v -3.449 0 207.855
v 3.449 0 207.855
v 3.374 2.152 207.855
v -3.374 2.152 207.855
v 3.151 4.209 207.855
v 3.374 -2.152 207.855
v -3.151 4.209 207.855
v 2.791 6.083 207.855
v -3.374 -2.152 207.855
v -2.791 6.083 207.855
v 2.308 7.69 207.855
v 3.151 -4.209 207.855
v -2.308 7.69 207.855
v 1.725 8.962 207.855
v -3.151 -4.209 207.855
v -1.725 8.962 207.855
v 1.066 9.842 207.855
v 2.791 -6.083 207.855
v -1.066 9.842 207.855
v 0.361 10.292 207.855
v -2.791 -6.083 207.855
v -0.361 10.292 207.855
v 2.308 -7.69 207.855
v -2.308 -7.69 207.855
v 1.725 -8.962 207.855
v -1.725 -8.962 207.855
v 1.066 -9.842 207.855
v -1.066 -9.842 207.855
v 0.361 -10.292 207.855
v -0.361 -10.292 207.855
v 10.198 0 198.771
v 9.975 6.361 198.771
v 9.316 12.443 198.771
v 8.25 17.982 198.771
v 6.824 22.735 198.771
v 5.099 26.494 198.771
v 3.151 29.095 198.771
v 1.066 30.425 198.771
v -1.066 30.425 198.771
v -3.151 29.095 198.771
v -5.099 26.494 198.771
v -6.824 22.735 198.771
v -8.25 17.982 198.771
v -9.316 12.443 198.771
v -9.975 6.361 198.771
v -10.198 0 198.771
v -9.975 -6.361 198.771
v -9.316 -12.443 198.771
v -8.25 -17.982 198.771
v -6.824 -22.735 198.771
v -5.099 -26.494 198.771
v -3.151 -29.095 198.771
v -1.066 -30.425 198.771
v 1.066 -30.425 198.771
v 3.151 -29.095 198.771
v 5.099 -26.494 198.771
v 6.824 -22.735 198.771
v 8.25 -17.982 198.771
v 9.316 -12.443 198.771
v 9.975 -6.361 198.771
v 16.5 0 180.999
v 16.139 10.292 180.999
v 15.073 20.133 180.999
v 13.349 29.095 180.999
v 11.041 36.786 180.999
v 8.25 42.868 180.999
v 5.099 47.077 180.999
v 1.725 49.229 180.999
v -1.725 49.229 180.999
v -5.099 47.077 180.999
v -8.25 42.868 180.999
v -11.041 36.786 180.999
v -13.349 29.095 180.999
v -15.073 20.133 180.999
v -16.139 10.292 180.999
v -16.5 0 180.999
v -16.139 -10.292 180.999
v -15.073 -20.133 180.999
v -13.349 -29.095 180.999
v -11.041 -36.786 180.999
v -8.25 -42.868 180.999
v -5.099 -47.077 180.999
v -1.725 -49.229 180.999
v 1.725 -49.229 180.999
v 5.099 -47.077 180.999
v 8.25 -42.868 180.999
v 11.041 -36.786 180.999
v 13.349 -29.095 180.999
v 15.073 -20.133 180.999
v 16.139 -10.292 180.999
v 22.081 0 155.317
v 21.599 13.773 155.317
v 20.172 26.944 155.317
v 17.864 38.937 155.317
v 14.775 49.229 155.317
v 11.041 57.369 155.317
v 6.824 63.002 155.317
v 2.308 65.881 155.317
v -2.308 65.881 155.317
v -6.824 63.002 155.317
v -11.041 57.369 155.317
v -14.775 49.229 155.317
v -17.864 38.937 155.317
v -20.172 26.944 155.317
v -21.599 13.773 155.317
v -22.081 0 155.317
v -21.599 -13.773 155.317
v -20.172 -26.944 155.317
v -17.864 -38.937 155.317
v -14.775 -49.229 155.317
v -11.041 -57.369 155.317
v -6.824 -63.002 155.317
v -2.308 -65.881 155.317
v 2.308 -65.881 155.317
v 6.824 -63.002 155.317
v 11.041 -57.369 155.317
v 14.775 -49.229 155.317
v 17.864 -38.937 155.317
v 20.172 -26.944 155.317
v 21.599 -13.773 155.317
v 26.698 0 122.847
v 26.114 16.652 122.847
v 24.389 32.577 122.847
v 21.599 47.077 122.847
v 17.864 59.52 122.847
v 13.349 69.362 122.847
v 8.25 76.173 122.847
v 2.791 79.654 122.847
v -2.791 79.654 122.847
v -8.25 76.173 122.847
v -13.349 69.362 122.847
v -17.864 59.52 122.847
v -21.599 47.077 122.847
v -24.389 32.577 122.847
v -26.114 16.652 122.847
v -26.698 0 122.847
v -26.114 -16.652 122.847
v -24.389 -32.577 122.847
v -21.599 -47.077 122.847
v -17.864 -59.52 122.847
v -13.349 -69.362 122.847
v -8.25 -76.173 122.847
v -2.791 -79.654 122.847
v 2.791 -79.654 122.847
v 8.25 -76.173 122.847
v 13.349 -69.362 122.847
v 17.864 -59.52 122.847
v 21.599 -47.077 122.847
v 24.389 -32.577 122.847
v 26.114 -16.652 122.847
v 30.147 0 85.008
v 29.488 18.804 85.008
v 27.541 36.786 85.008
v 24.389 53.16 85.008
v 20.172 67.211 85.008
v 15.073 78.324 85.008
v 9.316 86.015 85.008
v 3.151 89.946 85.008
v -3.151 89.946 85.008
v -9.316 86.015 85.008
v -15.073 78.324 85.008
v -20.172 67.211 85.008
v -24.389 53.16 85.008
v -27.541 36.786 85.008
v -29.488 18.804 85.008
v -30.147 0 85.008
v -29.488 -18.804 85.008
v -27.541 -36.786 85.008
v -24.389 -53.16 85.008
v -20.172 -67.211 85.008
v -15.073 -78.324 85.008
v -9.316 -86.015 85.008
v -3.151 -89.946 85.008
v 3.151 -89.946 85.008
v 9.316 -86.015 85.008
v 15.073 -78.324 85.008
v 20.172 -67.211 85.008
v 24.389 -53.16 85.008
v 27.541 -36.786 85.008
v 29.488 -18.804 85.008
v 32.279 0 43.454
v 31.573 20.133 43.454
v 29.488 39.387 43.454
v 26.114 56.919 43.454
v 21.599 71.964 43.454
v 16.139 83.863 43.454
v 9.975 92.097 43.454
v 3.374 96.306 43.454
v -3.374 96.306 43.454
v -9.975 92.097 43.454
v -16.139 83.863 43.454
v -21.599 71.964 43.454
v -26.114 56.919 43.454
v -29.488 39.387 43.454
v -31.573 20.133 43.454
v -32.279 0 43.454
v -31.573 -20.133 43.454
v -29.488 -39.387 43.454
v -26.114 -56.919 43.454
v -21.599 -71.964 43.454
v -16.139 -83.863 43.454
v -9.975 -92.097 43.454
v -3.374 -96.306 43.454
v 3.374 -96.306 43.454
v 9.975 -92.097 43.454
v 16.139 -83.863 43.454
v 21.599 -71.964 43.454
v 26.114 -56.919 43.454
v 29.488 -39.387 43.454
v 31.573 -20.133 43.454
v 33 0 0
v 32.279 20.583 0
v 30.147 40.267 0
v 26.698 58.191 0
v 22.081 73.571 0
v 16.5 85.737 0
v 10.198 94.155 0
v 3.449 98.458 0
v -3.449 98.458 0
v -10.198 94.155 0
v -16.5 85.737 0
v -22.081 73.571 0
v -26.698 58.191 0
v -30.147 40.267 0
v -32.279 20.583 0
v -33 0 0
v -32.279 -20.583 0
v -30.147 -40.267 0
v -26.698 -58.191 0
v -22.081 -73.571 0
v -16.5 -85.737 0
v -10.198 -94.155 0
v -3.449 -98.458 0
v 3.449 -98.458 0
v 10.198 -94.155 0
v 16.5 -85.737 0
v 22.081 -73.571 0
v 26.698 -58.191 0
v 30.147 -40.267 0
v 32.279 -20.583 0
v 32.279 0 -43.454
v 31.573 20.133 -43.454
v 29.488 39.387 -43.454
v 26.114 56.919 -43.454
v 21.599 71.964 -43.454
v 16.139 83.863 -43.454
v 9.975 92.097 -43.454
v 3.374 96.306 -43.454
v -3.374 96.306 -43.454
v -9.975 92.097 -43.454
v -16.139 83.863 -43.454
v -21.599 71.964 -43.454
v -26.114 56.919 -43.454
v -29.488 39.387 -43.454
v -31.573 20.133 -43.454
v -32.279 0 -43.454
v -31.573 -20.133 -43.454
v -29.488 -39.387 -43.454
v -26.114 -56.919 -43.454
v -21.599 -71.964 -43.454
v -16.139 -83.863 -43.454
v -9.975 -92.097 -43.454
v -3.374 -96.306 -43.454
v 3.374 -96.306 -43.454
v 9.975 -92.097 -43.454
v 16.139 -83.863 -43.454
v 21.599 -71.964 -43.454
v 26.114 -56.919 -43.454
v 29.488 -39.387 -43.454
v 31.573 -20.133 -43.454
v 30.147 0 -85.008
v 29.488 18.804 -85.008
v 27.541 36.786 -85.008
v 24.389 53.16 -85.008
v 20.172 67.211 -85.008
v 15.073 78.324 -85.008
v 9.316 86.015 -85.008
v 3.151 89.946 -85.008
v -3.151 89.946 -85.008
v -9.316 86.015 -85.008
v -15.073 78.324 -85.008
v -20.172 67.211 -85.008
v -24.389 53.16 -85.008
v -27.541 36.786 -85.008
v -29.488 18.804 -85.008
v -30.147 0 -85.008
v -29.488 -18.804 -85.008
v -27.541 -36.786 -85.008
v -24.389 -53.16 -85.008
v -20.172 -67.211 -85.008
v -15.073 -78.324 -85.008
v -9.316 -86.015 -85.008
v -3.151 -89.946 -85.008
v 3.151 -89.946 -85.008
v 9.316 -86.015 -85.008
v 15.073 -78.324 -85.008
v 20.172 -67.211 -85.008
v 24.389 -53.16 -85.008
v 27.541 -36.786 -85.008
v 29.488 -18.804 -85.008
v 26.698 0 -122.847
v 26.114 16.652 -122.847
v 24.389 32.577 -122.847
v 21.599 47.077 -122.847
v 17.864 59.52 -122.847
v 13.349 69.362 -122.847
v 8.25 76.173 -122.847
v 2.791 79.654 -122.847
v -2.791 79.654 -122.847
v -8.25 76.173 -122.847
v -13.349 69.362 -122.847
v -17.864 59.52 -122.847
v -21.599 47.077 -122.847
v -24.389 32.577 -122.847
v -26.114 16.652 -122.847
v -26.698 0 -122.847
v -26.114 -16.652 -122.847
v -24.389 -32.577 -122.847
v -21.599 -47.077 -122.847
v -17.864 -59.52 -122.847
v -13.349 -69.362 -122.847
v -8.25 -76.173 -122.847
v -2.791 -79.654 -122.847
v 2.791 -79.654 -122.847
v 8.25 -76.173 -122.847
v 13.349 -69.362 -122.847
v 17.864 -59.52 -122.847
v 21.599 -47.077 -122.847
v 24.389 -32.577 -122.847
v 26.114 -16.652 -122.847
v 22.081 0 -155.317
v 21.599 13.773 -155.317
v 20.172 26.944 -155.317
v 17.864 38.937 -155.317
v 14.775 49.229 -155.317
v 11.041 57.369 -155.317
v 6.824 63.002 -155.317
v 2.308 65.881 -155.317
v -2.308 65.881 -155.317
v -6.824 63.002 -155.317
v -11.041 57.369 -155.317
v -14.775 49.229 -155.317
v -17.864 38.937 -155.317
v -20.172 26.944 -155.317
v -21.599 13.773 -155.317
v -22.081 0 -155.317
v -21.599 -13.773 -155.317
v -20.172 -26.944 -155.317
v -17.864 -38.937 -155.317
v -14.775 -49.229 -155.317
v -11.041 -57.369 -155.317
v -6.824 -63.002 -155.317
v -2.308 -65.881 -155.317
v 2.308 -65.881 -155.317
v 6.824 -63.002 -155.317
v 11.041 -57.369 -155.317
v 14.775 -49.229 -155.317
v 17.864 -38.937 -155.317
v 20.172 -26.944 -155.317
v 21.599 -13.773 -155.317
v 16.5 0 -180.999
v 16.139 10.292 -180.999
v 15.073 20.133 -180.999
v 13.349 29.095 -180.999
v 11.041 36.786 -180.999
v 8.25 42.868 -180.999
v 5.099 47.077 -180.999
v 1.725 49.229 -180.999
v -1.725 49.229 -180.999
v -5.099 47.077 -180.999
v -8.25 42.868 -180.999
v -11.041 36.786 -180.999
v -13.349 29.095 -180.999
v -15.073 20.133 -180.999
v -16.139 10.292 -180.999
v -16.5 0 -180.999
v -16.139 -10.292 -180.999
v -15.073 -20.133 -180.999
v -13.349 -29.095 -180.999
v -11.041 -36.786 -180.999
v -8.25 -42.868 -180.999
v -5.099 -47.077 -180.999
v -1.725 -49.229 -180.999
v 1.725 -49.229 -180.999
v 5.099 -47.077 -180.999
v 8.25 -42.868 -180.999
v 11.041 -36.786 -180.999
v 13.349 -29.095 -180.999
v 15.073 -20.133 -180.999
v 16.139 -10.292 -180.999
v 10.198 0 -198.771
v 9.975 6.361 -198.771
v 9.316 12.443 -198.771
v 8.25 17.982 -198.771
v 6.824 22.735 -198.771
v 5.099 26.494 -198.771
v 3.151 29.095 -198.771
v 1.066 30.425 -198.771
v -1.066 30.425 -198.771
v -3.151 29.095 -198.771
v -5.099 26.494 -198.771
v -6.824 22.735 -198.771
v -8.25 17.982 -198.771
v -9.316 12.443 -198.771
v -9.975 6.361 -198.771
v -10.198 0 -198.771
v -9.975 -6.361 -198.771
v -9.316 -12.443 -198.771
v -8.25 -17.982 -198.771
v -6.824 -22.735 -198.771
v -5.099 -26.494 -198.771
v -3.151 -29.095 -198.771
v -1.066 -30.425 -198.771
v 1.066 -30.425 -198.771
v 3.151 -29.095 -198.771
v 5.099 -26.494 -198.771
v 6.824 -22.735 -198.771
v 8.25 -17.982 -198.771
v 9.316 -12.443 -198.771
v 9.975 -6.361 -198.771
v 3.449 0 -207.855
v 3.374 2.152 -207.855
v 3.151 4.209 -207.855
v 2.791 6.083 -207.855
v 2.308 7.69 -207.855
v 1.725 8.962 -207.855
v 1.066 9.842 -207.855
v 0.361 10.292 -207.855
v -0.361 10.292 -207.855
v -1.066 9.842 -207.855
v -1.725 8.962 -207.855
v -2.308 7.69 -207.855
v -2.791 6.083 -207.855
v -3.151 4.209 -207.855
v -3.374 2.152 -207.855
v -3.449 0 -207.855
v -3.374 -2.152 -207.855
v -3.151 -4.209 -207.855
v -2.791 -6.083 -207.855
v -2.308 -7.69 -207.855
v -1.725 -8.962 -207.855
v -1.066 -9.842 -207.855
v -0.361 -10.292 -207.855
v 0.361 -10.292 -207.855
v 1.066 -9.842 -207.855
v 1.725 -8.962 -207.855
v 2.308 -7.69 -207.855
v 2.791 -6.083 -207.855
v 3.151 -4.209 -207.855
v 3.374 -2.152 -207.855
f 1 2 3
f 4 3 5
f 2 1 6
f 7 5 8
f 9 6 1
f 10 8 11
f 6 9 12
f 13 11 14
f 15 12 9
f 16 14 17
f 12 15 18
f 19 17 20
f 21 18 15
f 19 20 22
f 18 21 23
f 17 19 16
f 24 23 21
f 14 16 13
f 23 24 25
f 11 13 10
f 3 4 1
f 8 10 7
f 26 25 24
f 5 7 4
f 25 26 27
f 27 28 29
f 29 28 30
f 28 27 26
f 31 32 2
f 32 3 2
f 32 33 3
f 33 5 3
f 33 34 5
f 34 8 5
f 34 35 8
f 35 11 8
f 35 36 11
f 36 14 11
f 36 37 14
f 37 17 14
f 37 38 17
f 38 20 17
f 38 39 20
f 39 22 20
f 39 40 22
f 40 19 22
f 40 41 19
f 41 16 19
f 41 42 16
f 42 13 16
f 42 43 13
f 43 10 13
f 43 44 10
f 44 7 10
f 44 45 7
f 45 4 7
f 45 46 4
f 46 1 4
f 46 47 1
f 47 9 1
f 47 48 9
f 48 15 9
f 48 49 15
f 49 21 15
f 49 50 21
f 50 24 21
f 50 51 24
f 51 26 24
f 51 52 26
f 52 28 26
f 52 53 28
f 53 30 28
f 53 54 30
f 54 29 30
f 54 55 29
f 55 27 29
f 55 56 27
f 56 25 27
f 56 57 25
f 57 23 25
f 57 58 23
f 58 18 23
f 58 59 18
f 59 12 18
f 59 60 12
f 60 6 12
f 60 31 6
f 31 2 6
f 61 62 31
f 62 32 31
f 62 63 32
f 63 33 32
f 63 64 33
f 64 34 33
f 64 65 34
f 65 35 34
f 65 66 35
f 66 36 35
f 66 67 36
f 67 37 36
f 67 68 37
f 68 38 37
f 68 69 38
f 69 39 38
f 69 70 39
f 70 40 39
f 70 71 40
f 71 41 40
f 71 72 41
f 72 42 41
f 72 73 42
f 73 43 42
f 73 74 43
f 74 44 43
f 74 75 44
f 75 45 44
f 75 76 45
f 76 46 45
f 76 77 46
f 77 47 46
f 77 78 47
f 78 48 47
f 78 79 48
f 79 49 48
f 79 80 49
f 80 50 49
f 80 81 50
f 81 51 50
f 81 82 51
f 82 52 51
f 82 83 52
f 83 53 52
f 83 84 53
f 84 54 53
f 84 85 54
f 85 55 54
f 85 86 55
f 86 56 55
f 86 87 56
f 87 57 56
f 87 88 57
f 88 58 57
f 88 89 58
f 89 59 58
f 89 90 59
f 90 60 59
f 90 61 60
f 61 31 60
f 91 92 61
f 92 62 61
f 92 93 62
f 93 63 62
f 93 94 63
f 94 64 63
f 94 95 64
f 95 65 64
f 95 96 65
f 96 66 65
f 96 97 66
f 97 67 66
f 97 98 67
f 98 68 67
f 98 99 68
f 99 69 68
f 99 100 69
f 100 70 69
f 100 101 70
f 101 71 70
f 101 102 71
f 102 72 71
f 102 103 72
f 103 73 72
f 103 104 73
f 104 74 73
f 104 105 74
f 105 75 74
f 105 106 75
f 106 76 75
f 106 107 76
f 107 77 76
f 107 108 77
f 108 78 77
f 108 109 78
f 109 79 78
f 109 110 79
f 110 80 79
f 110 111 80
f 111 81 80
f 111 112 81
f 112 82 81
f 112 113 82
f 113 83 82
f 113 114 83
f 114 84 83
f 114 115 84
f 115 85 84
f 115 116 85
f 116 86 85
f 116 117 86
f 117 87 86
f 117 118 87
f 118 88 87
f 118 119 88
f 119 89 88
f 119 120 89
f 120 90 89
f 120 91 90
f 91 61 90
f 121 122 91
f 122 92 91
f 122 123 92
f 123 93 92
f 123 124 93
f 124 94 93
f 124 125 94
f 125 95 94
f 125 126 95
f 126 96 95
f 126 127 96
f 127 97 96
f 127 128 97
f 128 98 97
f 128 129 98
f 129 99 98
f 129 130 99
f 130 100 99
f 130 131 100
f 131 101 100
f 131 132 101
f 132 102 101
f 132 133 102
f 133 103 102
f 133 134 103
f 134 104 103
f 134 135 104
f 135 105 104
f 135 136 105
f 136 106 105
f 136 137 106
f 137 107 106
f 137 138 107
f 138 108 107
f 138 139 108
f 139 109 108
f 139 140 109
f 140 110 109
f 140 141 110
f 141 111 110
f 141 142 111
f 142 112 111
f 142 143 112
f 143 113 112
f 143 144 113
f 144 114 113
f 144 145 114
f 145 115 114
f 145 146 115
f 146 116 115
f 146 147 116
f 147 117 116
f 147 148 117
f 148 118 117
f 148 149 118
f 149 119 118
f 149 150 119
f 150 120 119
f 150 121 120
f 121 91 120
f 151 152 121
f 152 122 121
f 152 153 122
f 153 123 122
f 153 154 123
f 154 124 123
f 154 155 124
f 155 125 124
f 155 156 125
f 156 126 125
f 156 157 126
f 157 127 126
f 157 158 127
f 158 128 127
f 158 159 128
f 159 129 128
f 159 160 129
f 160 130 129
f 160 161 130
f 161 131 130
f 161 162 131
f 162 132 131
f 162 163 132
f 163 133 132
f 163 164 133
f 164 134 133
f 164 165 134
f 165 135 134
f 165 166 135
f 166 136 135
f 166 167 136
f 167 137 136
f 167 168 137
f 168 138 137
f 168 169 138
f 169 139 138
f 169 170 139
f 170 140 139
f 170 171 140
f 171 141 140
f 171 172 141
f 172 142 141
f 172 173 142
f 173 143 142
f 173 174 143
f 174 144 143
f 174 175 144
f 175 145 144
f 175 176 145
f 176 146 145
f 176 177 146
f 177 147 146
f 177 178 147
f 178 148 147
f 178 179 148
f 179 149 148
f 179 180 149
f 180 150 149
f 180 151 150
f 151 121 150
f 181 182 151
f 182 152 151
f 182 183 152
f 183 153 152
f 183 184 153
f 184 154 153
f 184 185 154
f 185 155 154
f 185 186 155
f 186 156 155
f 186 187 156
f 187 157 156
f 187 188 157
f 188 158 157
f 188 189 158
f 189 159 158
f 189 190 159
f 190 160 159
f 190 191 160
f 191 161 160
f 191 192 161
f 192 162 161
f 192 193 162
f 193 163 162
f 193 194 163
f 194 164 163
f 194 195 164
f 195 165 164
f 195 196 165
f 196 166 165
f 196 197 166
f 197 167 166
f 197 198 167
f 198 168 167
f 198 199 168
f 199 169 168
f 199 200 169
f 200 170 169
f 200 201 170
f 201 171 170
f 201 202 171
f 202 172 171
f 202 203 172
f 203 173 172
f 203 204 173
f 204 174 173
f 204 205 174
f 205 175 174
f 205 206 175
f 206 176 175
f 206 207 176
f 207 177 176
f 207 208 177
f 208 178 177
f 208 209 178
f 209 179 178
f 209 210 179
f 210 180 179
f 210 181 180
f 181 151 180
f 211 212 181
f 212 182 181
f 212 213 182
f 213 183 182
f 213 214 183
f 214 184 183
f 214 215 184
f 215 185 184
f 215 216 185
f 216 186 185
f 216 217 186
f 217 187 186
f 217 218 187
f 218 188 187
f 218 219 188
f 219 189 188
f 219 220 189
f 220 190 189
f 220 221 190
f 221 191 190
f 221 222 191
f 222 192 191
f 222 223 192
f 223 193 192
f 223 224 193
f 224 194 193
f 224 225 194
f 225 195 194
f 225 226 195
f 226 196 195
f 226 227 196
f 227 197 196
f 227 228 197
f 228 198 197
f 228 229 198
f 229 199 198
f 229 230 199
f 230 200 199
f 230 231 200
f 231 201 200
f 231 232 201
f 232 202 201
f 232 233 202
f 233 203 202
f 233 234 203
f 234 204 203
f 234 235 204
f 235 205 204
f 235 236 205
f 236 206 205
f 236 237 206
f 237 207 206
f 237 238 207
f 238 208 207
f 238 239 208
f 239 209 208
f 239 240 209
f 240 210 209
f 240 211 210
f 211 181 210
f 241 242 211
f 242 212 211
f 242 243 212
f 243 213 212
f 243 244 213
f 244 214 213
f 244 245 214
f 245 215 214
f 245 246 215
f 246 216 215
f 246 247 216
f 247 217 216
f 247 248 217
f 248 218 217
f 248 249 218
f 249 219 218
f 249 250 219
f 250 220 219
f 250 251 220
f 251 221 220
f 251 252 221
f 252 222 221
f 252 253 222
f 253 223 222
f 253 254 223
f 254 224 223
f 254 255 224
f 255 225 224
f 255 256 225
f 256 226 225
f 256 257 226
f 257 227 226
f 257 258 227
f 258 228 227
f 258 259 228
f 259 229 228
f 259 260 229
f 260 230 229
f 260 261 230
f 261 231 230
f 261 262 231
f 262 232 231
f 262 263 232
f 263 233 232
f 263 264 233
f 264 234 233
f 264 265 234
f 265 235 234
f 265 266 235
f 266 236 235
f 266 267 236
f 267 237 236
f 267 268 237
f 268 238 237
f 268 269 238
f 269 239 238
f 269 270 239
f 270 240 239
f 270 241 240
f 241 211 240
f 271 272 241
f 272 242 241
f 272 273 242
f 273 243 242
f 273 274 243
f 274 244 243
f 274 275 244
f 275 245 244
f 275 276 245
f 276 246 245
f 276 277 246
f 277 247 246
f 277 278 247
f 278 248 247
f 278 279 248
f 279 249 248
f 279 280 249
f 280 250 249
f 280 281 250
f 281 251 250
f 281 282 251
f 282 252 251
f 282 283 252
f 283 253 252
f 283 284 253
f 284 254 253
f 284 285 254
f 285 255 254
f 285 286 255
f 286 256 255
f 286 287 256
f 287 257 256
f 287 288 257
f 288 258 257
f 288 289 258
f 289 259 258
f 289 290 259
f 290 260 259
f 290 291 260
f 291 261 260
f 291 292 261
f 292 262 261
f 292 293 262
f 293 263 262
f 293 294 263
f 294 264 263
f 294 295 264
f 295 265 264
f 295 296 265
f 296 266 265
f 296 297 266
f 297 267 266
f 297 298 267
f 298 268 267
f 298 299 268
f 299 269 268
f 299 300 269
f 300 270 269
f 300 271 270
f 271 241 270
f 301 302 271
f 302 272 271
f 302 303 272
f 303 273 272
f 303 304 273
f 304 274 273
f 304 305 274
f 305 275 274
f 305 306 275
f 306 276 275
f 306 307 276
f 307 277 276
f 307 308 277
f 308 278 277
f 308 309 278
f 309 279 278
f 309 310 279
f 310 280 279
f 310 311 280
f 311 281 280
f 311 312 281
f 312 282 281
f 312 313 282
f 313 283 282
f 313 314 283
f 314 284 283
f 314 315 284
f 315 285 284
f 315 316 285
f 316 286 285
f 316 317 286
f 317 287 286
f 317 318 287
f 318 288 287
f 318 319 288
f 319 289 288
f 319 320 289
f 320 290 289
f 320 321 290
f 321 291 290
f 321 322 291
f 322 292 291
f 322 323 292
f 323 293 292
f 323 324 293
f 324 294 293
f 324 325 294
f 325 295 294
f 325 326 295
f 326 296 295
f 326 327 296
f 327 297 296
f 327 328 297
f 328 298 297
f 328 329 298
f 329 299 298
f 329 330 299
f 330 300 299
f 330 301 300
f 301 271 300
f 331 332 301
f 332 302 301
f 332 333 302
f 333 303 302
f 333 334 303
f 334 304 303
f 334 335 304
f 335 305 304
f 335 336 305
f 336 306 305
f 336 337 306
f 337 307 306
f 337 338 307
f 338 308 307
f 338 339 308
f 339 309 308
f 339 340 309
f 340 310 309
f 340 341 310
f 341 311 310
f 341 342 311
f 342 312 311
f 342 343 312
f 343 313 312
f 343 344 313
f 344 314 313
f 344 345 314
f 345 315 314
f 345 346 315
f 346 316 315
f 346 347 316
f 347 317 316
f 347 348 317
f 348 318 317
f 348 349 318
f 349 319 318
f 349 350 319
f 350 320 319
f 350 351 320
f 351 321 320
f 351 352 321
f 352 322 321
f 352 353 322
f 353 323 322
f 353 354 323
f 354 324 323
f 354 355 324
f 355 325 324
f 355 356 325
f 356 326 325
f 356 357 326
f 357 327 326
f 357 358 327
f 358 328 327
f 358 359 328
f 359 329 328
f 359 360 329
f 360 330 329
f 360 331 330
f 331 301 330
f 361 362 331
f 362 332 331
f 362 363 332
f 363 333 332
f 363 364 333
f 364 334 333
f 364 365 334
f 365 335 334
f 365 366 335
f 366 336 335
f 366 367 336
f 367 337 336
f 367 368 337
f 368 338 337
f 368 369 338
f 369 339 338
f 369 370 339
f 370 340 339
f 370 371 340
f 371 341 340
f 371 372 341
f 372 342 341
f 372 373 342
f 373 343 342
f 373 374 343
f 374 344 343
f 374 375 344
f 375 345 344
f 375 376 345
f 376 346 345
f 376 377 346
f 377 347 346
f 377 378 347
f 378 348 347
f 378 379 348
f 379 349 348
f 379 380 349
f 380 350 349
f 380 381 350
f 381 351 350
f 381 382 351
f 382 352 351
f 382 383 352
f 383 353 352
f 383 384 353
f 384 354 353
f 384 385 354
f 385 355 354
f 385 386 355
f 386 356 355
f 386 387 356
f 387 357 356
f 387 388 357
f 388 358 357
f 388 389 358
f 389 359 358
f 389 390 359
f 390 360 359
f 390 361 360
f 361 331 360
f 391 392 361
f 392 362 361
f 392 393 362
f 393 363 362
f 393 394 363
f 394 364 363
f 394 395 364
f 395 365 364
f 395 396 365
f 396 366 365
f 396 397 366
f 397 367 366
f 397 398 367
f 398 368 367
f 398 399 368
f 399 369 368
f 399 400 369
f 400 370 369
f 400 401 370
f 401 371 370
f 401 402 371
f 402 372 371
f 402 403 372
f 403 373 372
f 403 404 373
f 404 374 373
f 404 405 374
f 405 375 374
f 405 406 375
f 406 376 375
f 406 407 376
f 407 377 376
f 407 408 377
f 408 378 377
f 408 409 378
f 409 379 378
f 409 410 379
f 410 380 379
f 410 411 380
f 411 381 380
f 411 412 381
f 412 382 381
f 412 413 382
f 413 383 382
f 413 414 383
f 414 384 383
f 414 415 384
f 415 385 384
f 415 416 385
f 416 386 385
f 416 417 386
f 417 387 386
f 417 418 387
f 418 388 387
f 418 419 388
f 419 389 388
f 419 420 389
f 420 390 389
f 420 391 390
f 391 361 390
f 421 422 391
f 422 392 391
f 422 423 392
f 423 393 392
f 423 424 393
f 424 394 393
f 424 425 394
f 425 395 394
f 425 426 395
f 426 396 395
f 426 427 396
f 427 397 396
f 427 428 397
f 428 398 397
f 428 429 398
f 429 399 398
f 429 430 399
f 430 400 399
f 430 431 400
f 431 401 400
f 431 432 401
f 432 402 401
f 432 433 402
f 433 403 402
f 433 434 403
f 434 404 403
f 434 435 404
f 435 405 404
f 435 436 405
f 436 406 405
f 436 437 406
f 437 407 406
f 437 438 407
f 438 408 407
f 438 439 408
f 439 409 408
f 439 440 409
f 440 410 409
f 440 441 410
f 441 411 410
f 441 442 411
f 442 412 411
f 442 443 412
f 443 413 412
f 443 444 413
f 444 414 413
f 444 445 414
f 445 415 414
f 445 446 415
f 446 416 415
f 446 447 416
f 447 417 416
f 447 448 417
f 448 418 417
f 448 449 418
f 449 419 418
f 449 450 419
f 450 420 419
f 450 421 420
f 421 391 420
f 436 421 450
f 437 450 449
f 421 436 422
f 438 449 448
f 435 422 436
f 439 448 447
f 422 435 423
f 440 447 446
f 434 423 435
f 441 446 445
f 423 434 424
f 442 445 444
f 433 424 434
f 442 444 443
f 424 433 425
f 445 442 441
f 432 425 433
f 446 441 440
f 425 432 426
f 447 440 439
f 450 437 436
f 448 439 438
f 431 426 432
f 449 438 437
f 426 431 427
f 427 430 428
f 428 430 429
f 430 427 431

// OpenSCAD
// Generated by SolidPython 1.0.1 on 2020-07-29 00:46:45


scale(v = [3, 9, 19]) {
	sphere(r = 11);
}
/***********************************************
*********      SolidPython code:      **********
************************************************
 
# import packages: SolidPython
from solid import *
from solid.utils import *
from itertools import chain, combinations, permutations


class Resize:

    def __init__(self, scad_file):
        self.scad_file = scad_file
        #self.scad_file = import_scad(scad_file)
        # cone/cylinder param:
        self.r1 = 0
        self.r2 = 0
        self.h = 0
        # rectangular prism param:
        self.w = 0
        self.l = 0
        # ellipse param:
        self.r = 0

    # import OpenScad code (file name corresponds to shape)


    # classify shape + parameters
    def assign(self, param1, param2, param3):
        if self.scad_file == 'cone.scad':
            self.r1 = param1
            self.r2 = param2
            self.h = param3
        elif self.scad_file == 'cylinder.scad':
            self.r1 = param1
            self.r2 = param2
            self.h = param3
        elif self.scad_file == 'rectangularPrism.scad':
            self.h = param1
            self.l = param2
            self.w = param3
        else:
            self.r = param1
            self.h = param2

    # resize parameters
    def iterate(self):
        x = range(3, 20, 2)
        i = 1
        if self.scad_file == 'cone.scad':
            tempList = list(permutations(x, 2))
            for temp in tempList:
                param1 = temp[0]
                param2 = temp[1]
                filepath = 'produced_scad_files/' + 'cone' + str(param1) + '_' + str(param2) + '_' + '.scad'
                scad_render_to_file(cylinder(h=param1, r1=param2, r2=0), filepath)

        elif self.scad_file == 'cylinder.scad':
            tempList = list(permutations(x, 3))
            for temp in tempList:
                param1 = temp[0]
                param2 = temp[1]
                filepath = 'produced_scad_files/' + 'cylinder' + str(param1) + '_' + str(param2) + '_' + '.scad'
                scad_render_to_file(cylinder(h=param1, r1=param2, r2=param2), filepath)

        elif self.scad_file == 'rectangularPrism.scad':
            tempList = list(permutations(x, 3))
            for temp in tempList:
                param1 = temp[0]
                param2 = temp[1]
                param3 = temp[2]
                filepath = 'produced_scad_files/' + 'rectangularPrism' + str(param1) + '_' + str(param2) + '_' + str(
                    param3) + '.scad'
                scad_render_to_file(cube(size=(param1, param2, param3)), filepath)

        elif self.scad_file == 'ellipse.scad':
            tempList = list(permutations(x, 4))
            for temp in tempList:
                param1 = temp[0]
                param2 = temp[1]
                param3 = temp[2]
                param4 = temp[3]
                filepath = 'produced_scad_files/' + 'ellipse' + str(param1) + '_' + str(param2) + '_' + str(param3) + '_' + str(param4) + '.scad'
                scad_render_to_file(scale([param1, param2, param3])(sphere(r=param4)), filepath)

    def render_to_scadfile(self):
        scad_render_to_file(scad, 'example.scad') 
 
************************************************/
